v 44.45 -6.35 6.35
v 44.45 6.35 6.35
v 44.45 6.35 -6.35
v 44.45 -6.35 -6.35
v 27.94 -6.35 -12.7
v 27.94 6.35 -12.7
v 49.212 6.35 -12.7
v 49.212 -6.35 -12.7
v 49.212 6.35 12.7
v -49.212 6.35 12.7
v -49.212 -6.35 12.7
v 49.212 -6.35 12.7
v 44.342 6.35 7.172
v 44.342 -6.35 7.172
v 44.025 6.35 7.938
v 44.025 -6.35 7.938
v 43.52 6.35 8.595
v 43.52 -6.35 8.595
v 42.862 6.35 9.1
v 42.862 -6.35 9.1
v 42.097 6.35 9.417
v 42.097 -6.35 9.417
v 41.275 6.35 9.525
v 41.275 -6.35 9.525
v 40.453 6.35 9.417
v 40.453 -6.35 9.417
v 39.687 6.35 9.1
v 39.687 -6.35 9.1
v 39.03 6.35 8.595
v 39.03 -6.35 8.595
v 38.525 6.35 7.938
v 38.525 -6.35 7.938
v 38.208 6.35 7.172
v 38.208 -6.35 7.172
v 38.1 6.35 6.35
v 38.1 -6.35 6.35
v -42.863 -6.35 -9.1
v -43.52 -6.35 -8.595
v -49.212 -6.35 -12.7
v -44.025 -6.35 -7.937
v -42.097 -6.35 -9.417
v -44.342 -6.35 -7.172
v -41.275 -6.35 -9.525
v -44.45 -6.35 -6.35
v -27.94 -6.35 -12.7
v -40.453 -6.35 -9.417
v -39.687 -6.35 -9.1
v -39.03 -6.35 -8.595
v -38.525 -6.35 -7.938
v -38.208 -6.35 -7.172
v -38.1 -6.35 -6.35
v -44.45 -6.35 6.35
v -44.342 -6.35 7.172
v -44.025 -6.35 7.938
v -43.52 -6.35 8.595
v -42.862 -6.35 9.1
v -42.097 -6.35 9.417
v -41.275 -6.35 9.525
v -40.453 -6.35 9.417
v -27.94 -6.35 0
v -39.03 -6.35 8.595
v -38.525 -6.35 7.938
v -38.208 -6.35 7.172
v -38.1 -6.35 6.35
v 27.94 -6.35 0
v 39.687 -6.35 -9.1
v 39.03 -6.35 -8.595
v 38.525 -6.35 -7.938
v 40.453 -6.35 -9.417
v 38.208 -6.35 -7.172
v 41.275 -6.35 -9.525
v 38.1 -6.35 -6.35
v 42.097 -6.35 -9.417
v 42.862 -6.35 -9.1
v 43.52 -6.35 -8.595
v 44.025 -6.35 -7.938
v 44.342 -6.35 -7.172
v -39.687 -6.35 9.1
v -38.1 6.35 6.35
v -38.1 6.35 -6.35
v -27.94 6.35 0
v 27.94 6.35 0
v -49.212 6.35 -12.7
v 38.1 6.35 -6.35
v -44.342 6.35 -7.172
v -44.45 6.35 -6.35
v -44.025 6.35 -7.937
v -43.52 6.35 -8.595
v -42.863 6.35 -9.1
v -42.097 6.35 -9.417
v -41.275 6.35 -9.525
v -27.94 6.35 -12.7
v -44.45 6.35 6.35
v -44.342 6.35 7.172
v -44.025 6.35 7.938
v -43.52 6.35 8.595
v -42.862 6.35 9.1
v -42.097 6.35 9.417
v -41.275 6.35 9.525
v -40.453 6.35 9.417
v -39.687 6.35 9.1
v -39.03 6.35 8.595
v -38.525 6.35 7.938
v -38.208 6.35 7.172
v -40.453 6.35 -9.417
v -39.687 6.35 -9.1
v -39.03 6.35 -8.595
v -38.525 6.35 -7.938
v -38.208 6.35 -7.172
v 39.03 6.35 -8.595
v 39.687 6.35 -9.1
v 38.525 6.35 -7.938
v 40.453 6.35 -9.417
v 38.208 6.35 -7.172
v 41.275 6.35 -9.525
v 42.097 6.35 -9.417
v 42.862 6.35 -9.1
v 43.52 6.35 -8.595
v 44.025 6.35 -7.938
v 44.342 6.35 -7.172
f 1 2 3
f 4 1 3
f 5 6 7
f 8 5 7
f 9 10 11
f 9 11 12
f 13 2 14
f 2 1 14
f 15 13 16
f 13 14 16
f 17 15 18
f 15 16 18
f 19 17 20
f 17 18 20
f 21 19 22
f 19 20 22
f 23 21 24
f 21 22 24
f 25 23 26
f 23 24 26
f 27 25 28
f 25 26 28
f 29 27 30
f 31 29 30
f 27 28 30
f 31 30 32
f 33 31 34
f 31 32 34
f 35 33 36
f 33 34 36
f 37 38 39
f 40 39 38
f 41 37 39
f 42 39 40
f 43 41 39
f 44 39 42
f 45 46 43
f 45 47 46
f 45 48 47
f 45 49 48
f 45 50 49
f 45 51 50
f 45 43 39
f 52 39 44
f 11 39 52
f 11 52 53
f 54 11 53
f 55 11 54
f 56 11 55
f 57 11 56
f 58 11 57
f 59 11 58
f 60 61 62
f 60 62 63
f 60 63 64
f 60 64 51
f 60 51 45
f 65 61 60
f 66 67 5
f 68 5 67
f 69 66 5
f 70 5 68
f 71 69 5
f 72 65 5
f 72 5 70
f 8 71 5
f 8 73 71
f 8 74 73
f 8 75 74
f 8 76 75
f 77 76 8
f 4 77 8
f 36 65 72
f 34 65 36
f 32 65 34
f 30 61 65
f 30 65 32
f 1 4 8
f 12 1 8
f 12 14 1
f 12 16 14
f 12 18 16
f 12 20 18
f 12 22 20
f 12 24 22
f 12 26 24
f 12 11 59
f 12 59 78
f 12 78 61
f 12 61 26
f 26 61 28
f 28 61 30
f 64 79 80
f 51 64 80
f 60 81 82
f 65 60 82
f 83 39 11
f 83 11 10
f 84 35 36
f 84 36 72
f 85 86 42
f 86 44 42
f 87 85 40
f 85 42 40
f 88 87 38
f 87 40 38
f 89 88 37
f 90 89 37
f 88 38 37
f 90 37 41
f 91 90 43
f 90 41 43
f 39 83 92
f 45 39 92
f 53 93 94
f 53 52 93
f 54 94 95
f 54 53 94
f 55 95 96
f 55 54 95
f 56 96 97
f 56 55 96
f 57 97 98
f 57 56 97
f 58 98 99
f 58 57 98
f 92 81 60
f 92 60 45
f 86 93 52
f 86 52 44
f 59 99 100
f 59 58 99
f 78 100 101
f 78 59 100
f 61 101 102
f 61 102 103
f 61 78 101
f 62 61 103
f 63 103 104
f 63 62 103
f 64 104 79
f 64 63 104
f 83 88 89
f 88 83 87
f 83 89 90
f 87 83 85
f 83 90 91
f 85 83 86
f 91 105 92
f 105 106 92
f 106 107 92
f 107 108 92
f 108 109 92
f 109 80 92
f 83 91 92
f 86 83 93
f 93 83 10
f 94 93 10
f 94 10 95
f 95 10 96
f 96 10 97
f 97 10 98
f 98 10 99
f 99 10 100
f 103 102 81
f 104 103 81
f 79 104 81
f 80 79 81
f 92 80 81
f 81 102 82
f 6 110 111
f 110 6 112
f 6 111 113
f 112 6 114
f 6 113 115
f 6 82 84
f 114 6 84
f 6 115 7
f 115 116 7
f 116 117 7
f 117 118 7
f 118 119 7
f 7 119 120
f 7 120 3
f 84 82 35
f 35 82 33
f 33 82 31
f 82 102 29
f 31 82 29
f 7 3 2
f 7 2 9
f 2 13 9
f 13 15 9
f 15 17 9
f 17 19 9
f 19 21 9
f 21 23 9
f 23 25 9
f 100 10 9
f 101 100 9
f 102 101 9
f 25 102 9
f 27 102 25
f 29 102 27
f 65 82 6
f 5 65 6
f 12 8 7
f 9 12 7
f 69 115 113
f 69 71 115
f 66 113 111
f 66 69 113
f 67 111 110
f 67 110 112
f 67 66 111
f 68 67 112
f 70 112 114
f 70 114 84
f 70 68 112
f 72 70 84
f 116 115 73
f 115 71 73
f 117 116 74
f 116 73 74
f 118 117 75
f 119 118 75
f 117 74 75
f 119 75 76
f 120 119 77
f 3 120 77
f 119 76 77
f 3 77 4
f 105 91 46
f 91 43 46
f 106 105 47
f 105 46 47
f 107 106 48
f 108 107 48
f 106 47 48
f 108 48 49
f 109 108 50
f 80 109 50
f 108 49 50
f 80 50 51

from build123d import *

# Parameters (mm, degrees)
SKETCH1_W            = 98.425
SKETCH1_H            = 12.7
BOSS_EXTRUDE1_DEPTH  = 12.7
CUT_EXTRUDE1_REACH   = 54.388
SKETCH2_W            = 6.35
SKETCH2_H            = 19.05
FILLET1_R            = 3.175
FILLET2_R            = 3.175
FILLET3_R            = 3.175
FILLET4_R            = 3.175
FILLET1_OF_MIRROR1_R = 3.175
FILLET2_OF_MIRROR1_R = 3.175
FILLET3_OF_MIRROR1_R = 3.175
FILLET4_OF_MIRROR1_R = 3.175
CUT_EXTRUDE2_REACH   = 54.388
SKETCH5_W            = 55.88
SKETCH5_H            = 12.7


with BuildPart() as part:
    # Sketch1 → Boss-Extrude1 (new, symmetric)
    with BuildSketch(Plane.XY):
        Rectangle(SKETCH1_W, SKETCH1_H)
    extrude(amount=BOSS_EXTRUDE1_DEPTH, both=True)

    # Sketch2 → Cut-Extrude1 (cut, up to next)
    with BuildSketch(Plane(origin=(0, 6.35, 0), x_dir=(1, 0, 0), z_dir=(0, 1, 0)), mode=Mode.PRIVATE) as cut_extrude1_sk1:
        with Locations((-41.275, 0)):
            Rectangle(SKETCH2_W, SKETCH2_H)
    cut_extrude1_tool1 = extrude(cut_extrude1_sk1.sketch, amount=-CUT_EXTRUDE1_REACH, mode=Mode.PRIVATE) & part.part
    cut_extrude1 = cut_extrude1_tool1.solids().sort_by_distance((-41.275, 6.35, 0))[0]
    add(cut_extrude1, mode=Mode.SUBTRACT)

    # Fillet1
    fillet1_edges = [part.edges().sort_by_distance(p)[0] for p in [
        (-44.45, 0, -9.525),
    ]]
    fillet(fillet1_edges, radius=FILLET1_R)

    # Fillet2
    fillet2_edges = [part.edges().sort_by_distance(p)[0] for p in [
        (-38.1, 0, -9.525),
    ]]
    fillet(fillet2_edges, radius=FILLET2_R - 0.0001)  # a hair under: the kernel refuses the full size

    # Fillet3
    fillet3_edges = [part.edges().sort_by_distance(p)[0] for p in [
        (-44.45, 0, 9.525),
    ]]
    fillet(fillet3_edges, radius=FILLET3_R)

    # Fillet4
    fillet4_edges = [part.edges().sort_by_distance(p)[0] for p in [
        (-38.1, 0, 9.525),
    ]]
    fillet(fillet4_edges, radius=FILLET4_R - 0.0001)  # a hair under: the kernel refuses the full size

    # Mirror1: Cut-Extrude1 across plane
    add(cut_extrude1.mirror(Plane(origin=(0, 0, 0), x_dir=(0, 0, 1), z_dir=(1, 0, 0))), mode=Mode.SUBTRACT)

    # Fillet1 of Mirror1
    fillet1_of_mirror1_edges = [part.edges().sort_by_distance(p)[0] for p in [
        (44.45, 0, -9.525),
    ]]
    fillet(fillet1_of_mirror1_edges, radius=FILLET1_OF_MIRROR1_R)

    # Fillet2 of Mirror1
    fillet2_of_mirror1_edges = [part.edges().sort_by_distance(p)[0] for p in [
        (38.1, 0, -9.525),
    ]]
    fillet(fillet2_of_mirror1_edges, radius=FILLET2_OF_MIRROR1_R - 0.0001)  # a hair under: the kernel refuses the full size

    # Fillet3 of Mirror1
    fillet3_of_mirror1_edges = [part.edges().sort_by_distance(p)[0] for p in [
        (44.45, 0, 9.525),
    ]]
    fillet(fillet3_of_mirror1_edges, radius=FILLET3_OF_MIRROR1_R)

    # Fillet4 of Mirror1
    fillet4_of_mirror1_edges = [part.edges().sort_by_distance(p)[0] for p in [
        (38.1, 0, 9.525),
    ]]
    fillet(fillet4_of_mirror1_edges, radius=FILLET4_OF_MIRROR1_R - 0.0001)  # a hair under: the kernel refuses the full size

    # Sketch5 → Cut-Extrude2 (cut, up to next)
    with BuildSketch(Plane(origin=(0, 6.35, 0), x_dir=(1, 0, 0), z_dir=(0, 1, 0)), mode=Mode.PRIVATE) as cut_extrude2_sk1:
        with Locations((0, 6.35)):
            Rectangle(SKETCH5_W, SKETCH5_H)
    cut_extrude2_tool1 = extrude(cut_extrude2_sk1.sketch, amount=-CUT_EXTRUDE2_REACH, mode=Mode.PRIVATE) & part.part
    add(cut_extrude2_tool1.solids().sort_by_distance((0, 6.35, -6.35))[0], mode=Mode.SUBTRACT)


solid = part.part
